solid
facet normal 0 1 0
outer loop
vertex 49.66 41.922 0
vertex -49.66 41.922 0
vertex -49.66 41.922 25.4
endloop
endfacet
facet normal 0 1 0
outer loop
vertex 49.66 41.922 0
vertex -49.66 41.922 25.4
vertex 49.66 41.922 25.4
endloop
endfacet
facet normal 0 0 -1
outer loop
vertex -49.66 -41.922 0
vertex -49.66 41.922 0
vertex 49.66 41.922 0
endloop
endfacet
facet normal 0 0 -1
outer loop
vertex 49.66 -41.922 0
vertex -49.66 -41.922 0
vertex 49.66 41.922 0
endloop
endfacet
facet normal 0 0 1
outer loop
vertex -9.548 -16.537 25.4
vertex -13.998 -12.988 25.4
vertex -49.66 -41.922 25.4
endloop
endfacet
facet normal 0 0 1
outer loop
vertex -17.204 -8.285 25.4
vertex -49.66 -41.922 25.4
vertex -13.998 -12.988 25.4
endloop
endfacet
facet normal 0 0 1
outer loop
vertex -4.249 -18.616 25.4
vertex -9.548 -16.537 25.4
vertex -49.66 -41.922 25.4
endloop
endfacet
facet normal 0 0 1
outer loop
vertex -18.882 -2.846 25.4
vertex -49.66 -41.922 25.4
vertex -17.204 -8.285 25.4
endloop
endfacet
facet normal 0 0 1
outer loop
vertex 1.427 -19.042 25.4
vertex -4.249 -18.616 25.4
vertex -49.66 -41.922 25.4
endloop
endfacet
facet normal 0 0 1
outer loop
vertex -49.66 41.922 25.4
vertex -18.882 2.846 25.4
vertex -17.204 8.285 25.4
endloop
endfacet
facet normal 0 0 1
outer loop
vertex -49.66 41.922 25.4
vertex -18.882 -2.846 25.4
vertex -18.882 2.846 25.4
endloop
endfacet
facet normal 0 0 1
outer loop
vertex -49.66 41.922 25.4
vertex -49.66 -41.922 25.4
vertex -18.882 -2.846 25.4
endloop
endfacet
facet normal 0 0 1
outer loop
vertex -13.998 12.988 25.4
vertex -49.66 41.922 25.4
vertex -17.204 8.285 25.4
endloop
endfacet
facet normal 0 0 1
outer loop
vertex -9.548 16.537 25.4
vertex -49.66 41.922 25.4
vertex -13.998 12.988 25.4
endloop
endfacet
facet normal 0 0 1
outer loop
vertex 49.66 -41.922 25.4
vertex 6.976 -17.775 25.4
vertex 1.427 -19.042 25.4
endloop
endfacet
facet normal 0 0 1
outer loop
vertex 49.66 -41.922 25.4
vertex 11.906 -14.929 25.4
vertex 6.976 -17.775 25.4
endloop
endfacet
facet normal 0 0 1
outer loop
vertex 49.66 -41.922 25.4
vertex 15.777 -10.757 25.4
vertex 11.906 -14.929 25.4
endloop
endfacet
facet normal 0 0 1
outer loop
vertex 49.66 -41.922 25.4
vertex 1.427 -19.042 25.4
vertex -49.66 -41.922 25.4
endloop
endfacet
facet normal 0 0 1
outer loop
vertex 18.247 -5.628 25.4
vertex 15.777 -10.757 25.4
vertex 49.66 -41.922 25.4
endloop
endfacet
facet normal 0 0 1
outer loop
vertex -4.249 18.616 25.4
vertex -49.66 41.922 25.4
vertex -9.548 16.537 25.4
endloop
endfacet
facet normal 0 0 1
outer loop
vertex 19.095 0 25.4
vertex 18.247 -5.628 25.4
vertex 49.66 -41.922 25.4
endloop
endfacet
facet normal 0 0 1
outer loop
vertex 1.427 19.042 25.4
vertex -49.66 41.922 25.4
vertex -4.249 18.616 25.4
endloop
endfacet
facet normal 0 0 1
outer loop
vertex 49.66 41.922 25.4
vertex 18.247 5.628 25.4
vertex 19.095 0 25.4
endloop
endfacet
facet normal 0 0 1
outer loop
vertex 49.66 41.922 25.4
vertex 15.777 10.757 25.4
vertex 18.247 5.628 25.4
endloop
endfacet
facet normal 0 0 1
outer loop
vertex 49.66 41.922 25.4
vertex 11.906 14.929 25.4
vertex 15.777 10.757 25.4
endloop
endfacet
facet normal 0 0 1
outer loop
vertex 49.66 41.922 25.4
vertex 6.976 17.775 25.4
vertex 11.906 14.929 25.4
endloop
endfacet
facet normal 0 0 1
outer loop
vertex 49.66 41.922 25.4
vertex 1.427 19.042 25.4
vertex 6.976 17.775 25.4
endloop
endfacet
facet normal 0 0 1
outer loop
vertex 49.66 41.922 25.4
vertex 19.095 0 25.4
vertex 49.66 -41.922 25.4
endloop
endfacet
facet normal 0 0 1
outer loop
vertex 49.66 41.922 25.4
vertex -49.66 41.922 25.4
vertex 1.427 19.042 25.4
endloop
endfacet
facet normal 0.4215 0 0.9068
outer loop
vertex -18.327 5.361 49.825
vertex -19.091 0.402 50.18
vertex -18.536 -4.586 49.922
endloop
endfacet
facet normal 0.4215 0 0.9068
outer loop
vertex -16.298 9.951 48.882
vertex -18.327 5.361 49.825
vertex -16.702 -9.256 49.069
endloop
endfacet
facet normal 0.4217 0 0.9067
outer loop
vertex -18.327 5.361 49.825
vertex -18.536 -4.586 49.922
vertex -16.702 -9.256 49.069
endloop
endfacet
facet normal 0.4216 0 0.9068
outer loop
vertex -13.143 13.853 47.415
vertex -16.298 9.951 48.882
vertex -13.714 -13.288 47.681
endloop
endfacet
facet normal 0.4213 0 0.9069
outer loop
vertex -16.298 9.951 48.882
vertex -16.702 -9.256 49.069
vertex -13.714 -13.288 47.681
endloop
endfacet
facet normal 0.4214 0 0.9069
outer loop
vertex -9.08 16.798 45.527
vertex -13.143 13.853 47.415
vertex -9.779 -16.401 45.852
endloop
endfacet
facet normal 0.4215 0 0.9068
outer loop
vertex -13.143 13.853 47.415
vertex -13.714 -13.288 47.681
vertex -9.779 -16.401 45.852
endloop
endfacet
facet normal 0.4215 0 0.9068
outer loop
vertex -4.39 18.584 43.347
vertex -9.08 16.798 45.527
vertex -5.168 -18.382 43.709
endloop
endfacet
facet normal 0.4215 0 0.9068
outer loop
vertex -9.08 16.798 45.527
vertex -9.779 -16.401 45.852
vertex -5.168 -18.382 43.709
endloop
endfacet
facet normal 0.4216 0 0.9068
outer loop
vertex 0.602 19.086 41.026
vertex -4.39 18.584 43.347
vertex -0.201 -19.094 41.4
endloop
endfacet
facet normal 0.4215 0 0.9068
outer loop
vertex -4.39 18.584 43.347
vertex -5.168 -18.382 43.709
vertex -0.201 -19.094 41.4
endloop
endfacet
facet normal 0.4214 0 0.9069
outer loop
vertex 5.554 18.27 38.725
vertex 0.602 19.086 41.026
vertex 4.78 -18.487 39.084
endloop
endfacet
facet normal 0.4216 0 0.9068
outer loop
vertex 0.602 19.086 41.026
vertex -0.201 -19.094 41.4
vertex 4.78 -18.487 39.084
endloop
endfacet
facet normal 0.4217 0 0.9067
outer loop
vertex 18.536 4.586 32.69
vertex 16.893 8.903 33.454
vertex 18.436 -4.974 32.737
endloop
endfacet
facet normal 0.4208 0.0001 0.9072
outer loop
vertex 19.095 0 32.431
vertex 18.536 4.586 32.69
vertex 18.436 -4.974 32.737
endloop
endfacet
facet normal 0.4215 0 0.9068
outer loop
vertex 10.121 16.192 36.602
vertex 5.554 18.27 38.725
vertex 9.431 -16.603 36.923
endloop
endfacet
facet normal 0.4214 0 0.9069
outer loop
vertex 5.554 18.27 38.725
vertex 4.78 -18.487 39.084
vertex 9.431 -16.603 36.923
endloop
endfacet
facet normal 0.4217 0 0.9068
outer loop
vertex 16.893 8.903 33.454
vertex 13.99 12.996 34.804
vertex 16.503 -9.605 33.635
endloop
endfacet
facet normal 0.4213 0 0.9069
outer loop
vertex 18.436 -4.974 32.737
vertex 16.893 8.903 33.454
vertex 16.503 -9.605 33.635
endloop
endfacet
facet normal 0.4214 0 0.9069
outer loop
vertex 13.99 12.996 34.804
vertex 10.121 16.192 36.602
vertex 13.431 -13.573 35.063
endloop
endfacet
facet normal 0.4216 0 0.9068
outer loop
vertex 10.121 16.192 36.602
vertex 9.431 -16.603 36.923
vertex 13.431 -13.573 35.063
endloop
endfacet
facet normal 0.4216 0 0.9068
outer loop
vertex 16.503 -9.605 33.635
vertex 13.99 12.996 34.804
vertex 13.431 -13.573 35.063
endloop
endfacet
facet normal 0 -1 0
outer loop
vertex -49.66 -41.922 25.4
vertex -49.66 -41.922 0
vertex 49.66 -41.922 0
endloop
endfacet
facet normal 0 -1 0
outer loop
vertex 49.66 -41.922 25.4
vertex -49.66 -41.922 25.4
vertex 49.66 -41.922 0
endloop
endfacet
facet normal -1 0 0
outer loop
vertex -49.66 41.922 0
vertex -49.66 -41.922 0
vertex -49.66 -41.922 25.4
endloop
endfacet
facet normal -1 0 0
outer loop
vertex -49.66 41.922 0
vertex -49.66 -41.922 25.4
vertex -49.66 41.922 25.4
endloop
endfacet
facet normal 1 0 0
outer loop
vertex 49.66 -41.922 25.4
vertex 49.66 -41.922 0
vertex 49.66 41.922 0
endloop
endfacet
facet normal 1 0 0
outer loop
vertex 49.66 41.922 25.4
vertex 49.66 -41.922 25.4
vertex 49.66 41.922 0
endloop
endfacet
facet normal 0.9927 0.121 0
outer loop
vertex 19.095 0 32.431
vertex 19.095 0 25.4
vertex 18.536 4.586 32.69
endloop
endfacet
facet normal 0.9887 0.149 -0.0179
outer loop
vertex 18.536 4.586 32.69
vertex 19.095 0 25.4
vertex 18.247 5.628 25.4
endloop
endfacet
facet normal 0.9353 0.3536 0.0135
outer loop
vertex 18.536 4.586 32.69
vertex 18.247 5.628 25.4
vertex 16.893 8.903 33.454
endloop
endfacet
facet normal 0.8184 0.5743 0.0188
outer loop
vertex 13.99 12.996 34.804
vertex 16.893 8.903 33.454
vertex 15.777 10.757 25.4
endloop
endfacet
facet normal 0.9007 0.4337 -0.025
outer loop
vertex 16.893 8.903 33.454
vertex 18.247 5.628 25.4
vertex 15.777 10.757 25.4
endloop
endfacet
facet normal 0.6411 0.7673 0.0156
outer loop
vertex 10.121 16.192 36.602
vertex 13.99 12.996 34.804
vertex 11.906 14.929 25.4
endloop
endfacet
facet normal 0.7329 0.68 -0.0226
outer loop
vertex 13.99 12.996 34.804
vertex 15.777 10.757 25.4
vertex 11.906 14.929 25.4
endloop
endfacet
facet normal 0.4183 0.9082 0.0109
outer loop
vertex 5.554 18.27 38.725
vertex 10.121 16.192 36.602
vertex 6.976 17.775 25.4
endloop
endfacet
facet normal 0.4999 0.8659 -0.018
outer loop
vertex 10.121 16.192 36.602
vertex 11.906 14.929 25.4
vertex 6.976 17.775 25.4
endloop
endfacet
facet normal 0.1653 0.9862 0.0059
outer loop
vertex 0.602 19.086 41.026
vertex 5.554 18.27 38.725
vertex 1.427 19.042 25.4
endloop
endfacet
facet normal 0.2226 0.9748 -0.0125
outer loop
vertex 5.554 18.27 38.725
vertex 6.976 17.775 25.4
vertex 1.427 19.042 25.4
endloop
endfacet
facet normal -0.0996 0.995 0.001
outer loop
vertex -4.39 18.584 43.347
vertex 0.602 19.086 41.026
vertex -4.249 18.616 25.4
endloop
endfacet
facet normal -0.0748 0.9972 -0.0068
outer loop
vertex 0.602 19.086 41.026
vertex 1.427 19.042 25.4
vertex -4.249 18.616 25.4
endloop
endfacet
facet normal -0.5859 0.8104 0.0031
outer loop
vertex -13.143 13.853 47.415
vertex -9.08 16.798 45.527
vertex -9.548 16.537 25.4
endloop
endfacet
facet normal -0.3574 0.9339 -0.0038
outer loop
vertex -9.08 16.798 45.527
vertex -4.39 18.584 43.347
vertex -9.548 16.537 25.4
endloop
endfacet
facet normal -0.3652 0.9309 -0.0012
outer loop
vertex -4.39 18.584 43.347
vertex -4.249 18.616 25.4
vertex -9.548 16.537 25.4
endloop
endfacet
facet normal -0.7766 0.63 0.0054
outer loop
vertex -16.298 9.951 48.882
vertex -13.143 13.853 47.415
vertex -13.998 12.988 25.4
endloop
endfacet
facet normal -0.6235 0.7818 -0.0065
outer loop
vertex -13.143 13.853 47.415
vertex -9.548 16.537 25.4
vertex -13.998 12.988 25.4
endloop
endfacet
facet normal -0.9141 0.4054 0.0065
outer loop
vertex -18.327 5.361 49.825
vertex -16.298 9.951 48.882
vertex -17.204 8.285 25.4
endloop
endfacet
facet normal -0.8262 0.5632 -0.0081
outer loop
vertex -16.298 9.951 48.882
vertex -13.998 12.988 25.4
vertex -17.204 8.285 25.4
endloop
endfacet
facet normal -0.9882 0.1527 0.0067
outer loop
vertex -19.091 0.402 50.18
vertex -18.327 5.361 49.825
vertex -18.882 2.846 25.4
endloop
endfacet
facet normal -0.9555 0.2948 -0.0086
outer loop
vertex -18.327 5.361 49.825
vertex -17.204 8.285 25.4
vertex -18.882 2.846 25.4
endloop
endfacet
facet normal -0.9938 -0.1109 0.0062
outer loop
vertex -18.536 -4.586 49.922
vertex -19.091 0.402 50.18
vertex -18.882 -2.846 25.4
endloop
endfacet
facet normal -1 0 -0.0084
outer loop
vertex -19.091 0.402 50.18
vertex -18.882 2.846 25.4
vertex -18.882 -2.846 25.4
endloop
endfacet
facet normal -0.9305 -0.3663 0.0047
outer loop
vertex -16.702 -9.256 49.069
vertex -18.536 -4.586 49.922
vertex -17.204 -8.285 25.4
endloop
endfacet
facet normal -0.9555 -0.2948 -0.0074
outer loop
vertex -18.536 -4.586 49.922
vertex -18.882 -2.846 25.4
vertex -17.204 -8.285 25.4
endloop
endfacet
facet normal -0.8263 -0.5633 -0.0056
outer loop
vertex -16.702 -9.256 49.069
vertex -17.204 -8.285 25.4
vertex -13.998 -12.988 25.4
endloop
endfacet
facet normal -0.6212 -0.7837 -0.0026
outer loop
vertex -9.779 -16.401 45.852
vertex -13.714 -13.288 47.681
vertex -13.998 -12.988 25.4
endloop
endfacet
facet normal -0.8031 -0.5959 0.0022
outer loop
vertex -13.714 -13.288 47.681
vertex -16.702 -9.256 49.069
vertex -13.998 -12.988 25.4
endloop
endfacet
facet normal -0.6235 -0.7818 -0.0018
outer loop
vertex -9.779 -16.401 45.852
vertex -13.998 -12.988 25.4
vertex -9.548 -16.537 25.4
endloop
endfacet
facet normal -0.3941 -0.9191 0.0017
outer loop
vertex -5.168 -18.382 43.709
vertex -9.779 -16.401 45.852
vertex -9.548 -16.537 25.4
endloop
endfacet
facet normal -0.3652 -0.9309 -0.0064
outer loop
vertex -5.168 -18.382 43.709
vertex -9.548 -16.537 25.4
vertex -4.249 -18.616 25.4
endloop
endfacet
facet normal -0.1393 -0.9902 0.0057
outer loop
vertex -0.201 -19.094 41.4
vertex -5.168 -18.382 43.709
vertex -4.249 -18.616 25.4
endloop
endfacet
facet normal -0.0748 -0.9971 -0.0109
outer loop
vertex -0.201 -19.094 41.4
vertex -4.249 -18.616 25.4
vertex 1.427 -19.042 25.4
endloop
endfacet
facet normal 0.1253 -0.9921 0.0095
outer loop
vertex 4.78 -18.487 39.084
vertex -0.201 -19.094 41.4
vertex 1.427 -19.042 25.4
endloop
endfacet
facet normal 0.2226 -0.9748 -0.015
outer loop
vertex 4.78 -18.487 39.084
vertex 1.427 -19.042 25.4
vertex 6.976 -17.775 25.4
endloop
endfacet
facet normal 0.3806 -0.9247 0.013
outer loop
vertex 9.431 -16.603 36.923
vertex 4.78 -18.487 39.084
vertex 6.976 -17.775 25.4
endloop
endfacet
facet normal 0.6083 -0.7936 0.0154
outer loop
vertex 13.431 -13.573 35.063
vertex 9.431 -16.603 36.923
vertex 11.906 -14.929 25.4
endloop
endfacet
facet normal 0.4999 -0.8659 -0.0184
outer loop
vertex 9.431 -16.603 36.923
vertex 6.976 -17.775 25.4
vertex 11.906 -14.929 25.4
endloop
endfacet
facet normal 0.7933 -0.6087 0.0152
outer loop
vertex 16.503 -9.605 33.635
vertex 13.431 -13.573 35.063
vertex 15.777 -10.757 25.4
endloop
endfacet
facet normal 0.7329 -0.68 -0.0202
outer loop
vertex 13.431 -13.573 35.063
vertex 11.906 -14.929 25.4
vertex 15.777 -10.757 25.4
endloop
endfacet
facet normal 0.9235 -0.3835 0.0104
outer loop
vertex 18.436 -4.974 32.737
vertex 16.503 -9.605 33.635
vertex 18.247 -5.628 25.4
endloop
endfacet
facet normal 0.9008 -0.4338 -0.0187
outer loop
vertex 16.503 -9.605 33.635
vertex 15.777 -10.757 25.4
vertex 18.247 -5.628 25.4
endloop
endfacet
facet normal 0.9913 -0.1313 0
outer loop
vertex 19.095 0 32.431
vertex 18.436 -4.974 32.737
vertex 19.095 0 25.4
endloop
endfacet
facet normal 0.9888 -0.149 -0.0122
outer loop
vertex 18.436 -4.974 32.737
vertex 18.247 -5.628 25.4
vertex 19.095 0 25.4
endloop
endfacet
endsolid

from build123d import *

# Parameters (mm, degrees)
F0_W     = 99.320174
F0_H     = 83.844102
F1_DEPTH = 25.4
F2_R     = 19.095077
F3_DEPTH = 25.4
F5_DEPTH = 44.35832


with BuildPart() as f1:
    # F0 (on Top) → F1 (new body)
    with BuildSketch(Plane.XY):
        Rectangle(F0_W, F0_H)
    extrude(amount=F1_DEPTH)

    # F2 (on face) → F3 (join)
    with BuildSketch(Plane.XY.offset(25.4)):
        Circle(F2_R)
    extrude(amount=F3_DEPTH)

    # F4 (on Front) → F5 (cut, symmetric)
    with BuildSketch(Plane.XZ):
        Polygon((21.894151, 53.422578), (-26.067015, 53.422578), (21.894151, 31.12971), align=None)
    extrude(amount=F5_DEPTH, both=True, mode=Mode.SUBTRACT)


solid = f1.part
